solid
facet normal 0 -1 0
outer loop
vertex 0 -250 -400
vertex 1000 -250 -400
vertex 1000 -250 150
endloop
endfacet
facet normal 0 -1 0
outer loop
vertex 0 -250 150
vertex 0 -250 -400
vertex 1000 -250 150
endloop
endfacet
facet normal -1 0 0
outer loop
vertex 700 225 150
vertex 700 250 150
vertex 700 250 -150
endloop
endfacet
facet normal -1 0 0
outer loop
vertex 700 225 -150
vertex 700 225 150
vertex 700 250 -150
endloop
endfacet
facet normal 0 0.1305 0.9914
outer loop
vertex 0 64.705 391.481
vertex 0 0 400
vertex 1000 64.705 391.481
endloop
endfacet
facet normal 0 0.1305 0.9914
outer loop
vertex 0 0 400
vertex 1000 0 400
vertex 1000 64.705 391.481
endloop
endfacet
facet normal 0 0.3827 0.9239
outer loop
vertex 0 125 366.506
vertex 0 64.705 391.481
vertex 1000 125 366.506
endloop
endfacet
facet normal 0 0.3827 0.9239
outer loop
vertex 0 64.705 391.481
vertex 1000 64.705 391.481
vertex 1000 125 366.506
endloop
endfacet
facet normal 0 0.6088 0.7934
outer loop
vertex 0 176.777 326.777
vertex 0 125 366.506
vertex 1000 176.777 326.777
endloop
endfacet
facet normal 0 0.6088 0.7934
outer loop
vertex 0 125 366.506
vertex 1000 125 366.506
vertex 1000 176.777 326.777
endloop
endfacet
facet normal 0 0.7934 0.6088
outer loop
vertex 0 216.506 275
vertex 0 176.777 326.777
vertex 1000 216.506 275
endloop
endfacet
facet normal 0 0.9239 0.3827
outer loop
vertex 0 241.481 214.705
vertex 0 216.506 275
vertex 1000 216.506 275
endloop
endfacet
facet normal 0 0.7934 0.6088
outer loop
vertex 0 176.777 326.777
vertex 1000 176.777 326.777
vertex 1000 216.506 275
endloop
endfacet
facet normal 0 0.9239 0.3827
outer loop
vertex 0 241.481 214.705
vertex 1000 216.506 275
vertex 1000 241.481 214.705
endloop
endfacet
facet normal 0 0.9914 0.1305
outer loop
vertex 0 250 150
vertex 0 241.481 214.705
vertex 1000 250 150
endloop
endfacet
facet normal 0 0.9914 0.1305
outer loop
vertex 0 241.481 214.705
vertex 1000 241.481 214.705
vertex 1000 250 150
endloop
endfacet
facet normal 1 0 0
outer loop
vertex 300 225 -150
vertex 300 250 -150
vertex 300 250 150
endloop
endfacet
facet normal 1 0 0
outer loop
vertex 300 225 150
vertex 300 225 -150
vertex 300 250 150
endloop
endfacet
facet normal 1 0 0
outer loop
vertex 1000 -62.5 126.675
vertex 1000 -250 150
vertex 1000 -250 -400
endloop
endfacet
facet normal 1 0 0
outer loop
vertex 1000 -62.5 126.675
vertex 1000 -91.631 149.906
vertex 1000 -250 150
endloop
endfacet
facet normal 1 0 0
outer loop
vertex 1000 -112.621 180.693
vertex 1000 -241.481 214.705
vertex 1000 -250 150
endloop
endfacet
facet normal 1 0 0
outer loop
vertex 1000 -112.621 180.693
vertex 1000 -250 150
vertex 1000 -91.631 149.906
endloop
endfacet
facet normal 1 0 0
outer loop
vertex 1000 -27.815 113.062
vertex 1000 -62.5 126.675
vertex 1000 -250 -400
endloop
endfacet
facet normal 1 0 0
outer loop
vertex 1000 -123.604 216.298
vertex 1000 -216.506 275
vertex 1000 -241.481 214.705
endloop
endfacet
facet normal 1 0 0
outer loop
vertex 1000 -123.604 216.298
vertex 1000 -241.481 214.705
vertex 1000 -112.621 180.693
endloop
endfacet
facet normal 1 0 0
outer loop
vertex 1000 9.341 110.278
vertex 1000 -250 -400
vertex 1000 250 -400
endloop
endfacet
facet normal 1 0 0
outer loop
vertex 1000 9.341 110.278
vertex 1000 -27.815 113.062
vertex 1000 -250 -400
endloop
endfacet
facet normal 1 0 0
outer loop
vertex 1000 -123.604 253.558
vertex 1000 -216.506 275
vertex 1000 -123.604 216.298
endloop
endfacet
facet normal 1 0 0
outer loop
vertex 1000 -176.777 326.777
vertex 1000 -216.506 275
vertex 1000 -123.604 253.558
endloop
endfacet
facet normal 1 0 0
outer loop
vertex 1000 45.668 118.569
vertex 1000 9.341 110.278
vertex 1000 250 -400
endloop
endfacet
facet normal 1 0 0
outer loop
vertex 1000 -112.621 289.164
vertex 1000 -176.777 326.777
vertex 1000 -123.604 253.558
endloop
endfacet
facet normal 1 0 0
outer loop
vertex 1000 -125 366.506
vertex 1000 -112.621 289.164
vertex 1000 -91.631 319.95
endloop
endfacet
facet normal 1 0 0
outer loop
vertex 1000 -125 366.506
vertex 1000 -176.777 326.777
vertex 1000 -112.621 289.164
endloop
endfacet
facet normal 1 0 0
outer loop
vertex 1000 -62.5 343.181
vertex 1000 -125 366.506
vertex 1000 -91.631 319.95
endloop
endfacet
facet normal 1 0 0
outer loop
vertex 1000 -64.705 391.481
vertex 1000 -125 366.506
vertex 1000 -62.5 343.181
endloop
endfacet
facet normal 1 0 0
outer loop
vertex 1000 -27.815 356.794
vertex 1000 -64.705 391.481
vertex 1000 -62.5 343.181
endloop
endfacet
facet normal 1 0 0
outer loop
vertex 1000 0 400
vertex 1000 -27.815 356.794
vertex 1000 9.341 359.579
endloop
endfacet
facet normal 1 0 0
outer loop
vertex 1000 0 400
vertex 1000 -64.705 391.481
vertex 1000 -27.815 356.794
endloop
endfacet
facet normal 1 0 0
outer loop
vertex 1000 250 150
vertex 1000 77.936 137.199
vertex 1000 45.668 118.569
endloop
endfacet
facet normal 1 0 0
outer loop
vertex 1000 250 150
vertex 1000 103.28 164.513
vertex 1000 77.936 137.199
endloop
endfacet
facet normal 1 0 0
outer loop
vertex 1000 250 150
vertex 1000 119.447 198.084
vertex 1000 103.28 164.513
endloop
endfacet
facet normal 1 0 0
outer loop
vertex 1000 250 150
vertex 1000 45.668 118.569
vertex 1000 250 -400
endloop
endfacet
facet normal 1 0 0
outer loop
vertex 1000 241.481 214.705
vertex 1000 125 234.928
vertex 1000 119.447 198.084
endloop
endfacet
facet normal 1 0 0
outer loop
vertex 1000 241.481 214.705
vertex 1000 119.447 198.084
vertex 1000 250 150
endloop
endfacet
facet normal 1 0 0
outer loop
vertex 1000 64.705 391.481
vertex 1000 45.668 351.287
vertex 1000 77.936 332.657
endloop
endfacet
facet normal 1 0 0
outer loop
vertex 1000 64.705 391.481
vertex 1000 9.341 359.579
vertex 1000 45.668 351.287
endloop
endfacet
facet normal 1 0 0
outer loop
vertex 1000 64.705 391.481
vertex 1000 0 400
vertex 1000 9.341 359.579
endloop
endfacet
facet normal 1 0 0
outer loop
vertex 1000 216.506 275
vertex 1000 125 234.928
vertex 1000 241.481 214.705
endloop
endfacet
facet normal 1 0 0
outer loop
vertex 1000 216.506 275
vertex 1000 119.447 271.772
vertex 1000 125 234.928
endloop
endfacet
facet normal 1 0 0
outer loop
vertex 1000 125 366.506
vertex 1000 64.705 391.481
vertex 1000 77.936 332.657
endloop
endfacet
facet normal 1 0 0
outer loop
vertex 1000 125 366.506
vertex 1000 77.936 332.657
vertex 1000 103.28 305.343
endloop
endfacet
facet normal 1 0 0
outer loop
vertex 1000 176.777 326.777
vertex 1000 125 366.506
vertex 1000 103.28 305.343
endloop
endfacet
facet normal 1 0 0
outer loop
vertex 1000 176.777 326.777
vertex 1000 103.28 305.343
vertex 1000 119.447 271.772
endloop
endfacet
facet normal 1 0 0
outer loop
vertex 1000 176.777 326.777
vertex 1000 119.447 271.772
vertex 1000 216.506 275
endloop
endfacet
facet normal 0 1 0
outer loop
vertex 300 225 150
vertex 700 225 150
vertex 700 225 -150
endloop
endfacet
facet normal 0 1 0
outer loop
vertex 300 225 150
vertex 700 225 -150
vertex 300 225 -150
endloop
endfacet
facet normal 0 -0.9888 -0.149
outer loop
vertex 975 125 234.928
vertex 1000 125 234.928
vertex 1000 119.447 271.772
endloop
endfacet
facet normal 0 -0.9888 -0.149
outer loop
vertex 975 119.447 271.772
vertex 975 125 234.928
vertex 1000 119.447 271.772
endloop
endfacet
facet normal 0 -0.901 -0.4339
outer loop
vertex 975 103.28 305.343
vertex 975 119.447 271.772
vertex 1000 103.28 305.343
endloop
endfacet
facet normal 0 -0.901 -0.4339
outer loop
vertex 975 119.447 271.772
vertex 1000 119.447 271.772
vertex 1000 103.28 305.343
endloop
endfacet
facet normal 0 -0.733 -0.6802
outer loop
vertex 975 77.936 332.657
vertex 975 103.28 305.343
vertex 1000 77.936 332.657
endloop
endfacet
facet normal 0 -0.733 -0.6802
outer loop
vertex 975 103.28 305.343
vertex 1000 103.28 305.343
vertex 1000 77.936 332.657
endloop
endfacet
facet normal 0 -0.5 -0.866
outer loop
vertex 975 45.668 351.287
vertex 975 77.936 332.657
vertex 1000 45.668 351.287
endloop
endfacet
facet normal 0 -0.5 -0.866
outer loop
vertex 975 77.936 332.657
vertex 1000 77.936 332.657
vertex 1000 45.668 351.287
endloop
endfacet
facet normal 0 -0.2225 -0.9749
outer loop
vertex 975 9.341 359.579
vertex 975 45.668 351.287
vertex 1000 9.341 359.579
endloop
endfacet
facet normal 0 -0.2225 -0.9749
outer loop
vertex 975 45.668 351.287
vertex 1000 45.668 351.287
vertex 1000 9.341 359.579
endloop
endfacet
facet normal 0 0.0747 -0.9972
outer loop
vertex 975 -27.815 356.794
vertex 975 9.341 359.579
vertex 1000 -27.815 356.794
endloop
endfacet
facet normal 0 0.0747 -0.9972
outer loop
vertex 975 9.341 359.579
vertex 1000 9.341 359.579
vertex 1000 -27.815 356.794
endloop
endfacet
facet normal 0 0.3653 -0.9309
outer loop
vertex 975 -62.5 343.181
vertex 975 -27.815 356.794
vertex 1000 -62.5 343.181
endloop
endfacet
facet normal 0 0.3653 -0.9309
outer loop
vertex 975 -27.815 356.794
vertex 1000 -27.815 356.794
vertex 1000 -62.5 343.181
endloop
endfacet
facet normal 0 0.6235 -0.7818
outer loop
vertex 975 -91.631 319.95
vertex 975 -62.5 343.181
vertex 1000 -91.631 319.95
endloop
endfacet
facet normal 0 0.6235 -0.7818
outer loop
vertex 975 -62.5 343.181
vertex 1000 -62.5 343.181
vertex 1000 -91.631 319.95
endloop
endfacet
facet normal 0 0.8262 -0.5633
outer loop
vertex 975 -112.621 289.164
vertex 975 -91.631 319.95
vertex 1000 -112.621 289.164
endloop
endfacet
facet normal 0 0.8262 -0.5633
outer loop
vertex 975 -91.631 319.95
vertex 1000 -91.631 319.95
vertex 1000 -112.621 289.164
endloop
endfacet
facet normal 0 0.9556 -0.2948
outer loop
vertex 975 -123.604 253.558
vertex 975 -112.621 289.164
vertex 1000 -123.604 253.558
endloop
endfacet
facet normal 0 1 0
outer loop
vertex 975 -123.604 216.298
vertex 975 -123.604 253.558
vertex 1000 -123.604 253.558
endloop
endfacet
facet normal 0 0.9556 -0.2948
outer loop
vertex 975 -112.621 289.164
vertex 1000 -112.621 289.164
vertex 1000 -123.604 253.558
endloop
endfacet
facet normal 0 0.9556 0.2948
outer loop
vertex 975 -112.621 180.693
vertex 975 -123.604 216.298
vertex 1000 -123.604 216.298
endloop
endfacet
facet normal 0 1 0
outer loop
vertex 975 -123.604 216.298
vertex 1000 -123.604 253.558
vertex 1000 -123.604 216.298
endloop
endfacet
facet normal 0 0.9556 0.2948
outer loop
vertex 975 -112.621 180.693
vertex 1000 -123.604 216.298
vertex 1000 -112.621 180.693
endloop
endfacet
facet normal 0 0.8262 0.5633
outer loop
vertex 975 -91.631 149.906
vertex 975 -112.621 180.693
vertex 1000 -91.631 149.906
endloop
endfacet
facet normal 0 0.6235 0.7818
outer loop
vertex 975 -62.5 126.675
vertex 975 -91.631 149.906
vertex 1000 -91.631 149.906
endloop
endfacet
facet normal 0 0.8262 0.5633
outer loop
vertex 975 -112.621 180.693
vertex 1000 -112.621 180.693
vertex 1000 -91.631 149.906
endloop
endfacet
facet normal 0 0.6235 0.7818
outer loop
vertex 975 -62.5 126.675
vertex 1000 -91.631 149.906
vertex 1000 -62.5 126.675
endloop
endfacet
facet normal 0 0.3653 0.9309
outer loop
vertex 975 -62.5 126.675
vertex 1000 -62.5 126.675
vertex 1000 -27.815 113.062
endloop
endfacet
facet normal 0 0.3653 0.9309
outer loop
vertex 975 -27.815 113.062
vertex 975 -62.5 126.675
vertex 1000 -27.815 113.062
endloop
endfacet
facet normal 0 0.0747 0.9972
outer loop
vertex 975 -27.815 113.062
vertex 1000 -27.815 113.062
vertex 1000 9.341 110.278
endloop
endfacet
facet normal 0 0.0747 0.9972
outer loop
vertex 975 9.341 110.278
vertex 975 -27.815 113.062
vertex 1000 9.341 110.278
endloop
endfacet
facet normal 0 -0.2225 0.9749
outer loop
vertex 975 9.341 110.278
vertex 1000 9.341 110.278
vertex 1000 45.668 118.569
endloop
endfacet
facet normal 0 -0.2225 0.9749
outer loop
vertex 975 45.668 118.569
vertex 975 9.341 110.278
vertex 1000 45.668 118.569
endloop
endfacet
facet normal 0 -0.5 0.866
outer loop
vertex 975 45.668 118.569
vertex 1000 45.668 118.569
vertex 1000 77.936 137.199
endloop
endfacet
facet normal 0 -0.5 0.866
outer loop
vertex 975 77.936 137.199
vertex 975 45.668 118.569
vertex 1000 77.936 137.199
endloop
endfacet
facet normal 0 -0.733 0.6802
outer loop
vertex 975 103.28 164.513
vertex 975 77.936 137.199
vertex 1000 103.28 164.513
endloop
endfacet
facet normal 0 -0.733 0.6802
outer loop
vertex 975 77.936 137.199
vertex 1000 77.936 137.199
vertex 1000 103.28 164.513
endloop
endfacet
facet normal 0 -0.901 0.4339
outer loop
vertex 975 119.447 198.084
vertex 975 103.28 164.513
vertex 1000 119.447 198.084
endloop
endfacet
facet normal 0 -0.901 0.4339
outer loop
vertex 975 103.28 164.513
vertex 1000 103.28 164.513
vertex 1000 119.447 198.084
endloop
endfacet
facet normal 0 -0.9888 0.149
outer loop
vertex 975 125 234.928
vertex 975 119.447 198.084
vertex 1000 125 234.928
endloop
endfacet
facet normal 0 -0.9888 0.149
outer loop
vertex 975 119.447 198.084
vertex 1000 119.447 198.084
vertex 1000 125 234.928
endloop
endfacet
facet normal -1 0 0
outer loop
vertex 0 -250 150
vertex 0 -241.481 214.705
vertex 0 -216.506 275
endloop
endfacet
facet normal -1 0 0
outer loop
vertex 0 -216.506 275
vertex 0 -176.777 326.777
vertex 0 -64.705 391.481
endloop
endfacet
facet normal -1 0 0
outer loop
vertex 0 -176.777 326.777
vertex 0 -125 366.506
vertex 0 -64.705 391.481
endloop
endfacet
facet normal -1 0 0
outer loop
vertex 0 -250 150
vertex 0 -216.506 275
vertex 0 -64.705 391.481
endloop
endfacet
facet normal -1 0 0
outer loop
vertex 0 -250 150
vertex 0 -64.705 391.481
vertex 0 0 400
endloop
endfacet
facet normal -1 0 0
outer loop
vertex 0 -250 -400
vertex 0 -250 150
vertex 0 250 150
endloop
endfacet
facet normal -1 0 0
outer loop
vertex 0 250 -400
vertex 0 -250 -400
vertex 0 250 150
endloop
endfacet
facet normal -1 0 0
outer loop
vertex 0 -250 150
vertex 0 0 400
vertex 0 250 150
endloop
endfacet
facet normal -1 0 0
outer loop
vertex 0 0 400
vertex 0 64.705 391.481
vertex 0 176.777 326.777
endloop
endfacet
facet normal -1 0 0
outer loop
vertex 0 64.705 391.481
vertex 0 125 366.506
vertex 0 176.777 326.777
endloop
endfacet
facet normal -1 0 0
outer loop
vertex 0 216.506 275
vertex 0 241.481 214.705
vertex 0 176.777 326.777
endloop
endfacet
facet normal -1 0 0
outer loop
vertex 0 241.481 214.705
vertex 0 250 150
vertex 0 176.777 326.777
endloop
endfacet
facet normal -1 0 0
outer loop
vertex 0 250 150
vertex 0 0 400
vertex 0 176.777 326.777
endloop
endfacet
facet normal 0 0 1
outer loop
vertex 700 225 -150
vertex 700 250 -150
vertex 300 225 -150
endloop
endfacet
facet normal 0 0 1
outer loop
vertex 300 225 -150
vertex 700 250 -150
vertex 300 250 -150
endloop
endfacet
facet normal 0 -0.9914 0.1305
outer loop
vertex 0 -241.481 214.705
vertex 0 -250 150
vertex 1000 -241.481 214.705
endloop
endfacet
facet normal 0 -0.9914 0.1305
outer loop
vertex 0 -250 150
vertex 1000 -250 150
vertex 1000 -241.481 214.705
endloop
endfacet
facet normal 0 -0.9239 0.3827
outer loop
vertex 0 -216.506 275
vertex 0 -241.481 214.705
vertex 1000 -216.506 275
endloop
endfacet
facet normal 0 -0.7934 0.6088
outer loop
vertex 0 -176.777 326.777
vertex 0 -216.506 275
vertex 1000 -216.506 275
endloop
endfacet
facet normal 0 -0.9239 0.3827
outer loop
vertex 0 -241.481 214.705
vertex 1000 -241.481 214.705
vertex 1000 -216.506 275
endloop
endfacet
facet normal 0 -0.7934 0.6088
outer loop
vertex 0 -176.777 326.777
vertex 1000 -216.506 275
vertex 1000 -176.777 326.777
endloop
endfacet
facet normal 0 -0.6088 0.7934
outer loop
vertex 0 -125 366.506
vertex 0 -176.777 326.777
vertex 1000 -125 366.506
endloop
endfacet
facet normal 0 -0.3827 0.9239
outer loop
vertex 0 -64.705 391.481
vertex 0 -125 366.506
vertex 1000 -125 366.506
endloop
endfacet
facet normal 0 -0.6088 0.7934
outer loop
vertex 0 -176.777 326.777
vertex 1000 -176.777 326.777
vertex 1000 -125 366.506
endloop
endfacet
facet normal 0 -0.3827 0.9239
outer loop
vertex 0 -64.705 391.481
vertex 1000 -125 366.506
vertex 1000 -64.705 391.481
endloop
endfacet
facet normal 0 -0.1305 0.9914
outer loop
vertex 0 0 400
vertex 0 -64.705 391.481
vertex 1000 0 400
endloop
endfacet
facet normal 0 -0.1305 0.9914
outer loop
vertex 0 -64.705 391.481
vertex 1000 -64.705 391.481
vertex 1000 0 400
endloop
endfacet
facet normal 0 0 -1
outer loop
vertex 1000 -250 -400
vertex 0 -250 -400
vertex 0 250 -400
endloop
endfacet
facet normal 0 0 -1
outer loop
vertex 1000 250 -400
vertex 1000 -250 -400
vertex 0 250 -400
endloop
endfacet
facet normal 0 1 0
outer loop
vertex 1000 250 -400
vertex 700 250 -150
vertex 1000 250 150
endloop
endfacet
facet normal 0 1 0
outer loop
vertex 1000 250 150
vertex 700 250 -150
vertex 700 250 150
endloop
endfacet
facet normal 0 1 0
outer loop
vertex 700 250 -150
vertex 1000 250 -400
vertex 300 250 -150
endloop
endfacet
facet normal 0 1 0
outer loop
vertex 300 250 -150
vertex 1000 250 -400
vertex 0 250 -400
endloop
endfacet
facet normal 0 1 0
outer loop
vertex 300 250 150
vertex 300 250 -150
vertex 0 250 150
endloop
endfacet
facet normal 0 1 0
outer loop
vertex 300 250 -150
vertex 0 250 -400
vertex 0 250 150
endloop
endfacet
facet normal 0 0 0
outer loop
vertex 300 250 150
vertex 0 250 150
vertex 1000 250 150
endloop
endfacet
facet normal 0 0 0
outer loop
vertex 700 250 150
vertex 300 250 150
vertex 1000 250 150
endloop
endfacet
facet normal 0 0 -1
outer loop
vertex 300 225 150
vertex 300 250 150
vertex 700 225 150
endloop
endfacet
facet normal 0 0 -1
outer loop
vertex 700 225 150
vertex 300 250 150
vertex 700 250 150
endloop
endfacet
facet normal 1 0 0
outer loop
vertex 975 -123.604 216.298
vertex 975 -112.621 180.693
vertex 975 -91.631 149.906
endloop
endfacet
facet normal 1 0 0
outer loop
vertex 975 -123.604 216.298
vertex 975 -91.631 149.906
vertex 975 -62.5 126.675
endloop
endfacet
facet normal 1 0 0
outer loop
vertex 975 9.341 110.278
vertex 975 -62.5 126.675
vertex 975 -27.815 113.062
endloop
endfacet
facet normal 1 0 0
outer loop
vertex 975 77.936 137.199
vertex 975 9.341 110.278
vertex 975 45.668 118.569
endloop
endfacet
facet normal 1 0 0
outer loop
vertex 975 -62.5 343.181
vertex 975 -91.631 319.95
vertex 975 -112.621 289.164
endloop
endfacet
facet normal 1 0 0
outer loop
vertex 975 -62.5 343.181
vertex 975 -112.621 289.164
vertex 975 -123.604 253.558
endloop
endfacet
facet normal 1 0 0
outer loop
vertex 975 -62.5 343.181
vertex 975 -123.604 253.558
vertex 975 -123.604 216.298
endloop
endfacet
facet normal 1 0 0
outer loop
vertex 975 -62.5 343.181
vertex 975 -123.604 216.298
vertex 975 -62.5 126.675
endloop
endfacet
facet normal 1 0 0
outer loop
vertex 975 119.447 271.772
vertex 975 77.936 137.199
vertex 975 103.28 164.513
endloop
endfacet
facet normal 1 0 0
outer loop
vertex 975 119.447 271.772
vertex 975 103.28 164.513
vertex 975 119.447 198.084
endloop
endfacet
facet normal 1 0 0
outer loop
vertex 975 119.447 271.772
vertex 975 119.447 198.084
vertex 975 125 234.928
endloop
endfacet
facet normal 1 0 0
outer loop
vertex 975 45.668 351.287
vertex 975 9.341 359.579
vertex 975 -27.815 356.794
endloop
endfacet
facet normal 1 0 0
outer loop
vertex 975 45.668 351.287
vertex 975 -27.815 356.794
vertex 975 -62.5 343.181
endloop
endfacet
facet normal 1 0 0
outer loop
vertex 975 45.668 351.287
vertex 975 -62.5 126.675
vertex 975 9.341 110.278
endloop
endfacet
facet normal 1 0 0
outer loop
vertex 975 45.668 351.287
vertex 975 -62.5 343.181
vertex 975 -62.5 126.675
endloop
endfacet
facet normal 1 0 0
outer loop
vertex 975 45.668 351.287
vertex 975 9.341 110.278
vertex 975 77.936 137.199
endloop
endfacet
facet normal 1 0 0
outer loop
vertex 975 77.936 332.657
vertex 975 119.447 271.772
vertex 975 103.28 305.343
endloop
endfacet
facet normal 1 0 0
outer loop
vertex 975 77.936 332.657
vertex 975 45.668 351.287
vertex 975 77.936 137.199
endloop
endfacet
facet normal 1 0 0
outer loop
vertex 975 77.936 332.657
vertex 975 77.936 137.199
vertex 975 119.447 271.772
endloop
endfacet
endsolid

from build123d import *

# Parameters (mm, degrees)
F0_W     = 500
F0_H     = 800
F1_DEPTH = 1000
F2_R     = 125
F3_DEPTH = 25
F4_R     = 249.99999
F6_DEPTH = 25
F7_W     = 600
F7_H     = 8.0311238766
F8_DEPTH = 100


# Not quite as in the source:
# - a fillet or chamfer is up to 0.001 mm smaller than in the source, because OpenCascade refuses the exact size


with BuildPart() as f1:
    # F0 (on Right) → F1 (new body)
    with BuildSketch(Plane.YZ):
        Rectangle(F0_W, F0_H)
    extrude(amount=F1_DEPTH)

    # F2 (on face) → F3 (cut)
    with BuildSketch(Plane.YZ.offset(1000)):
        with Locations((0, 234.9280565977)):
            Circle(F2_R)
    extrude(amount=-F3_DEPTH, mode=Mode.SUBTRACT)

    # F4 (radius 250 in the source; OpenCascade refuses exactly that, so slightly less here)
    f4_edges = [f1.edges().sort_by_distance(p)[0] for p in [
        (500, 250, 400),
        (500, -250, 400),
    ]]
    fillet(f4_edges, radius=F4_R)

    # F5 (on face) → F6 (cut)
    with BuildSketch(Plane(origin=(0, 250, 0), x_dir=(-1, 0, 0), z_dir=(0, 1, 0))):
        Polygon((-300, 150), (-700, 150), (-700, -14.3443720028), (-700, -150), (-300, -150), align=None)
    extrude(amount=-F6_DEPTH, mode=Mode.SUBTRACT)

    # F7 (on face) → F8 (cut)
    with BuildSketch(Plane(origin=(0, 250, 0), x_dir=(-1, 0, 0), z_dir=(0, 1, 0))):
        with Locations((-500, -404.0155619383)):
            Rectangle(F7_W, F7_H)
    extrude(amount=-F8_DEPTH, mode=Mode.SUBTRACT)


solid = f1.part
